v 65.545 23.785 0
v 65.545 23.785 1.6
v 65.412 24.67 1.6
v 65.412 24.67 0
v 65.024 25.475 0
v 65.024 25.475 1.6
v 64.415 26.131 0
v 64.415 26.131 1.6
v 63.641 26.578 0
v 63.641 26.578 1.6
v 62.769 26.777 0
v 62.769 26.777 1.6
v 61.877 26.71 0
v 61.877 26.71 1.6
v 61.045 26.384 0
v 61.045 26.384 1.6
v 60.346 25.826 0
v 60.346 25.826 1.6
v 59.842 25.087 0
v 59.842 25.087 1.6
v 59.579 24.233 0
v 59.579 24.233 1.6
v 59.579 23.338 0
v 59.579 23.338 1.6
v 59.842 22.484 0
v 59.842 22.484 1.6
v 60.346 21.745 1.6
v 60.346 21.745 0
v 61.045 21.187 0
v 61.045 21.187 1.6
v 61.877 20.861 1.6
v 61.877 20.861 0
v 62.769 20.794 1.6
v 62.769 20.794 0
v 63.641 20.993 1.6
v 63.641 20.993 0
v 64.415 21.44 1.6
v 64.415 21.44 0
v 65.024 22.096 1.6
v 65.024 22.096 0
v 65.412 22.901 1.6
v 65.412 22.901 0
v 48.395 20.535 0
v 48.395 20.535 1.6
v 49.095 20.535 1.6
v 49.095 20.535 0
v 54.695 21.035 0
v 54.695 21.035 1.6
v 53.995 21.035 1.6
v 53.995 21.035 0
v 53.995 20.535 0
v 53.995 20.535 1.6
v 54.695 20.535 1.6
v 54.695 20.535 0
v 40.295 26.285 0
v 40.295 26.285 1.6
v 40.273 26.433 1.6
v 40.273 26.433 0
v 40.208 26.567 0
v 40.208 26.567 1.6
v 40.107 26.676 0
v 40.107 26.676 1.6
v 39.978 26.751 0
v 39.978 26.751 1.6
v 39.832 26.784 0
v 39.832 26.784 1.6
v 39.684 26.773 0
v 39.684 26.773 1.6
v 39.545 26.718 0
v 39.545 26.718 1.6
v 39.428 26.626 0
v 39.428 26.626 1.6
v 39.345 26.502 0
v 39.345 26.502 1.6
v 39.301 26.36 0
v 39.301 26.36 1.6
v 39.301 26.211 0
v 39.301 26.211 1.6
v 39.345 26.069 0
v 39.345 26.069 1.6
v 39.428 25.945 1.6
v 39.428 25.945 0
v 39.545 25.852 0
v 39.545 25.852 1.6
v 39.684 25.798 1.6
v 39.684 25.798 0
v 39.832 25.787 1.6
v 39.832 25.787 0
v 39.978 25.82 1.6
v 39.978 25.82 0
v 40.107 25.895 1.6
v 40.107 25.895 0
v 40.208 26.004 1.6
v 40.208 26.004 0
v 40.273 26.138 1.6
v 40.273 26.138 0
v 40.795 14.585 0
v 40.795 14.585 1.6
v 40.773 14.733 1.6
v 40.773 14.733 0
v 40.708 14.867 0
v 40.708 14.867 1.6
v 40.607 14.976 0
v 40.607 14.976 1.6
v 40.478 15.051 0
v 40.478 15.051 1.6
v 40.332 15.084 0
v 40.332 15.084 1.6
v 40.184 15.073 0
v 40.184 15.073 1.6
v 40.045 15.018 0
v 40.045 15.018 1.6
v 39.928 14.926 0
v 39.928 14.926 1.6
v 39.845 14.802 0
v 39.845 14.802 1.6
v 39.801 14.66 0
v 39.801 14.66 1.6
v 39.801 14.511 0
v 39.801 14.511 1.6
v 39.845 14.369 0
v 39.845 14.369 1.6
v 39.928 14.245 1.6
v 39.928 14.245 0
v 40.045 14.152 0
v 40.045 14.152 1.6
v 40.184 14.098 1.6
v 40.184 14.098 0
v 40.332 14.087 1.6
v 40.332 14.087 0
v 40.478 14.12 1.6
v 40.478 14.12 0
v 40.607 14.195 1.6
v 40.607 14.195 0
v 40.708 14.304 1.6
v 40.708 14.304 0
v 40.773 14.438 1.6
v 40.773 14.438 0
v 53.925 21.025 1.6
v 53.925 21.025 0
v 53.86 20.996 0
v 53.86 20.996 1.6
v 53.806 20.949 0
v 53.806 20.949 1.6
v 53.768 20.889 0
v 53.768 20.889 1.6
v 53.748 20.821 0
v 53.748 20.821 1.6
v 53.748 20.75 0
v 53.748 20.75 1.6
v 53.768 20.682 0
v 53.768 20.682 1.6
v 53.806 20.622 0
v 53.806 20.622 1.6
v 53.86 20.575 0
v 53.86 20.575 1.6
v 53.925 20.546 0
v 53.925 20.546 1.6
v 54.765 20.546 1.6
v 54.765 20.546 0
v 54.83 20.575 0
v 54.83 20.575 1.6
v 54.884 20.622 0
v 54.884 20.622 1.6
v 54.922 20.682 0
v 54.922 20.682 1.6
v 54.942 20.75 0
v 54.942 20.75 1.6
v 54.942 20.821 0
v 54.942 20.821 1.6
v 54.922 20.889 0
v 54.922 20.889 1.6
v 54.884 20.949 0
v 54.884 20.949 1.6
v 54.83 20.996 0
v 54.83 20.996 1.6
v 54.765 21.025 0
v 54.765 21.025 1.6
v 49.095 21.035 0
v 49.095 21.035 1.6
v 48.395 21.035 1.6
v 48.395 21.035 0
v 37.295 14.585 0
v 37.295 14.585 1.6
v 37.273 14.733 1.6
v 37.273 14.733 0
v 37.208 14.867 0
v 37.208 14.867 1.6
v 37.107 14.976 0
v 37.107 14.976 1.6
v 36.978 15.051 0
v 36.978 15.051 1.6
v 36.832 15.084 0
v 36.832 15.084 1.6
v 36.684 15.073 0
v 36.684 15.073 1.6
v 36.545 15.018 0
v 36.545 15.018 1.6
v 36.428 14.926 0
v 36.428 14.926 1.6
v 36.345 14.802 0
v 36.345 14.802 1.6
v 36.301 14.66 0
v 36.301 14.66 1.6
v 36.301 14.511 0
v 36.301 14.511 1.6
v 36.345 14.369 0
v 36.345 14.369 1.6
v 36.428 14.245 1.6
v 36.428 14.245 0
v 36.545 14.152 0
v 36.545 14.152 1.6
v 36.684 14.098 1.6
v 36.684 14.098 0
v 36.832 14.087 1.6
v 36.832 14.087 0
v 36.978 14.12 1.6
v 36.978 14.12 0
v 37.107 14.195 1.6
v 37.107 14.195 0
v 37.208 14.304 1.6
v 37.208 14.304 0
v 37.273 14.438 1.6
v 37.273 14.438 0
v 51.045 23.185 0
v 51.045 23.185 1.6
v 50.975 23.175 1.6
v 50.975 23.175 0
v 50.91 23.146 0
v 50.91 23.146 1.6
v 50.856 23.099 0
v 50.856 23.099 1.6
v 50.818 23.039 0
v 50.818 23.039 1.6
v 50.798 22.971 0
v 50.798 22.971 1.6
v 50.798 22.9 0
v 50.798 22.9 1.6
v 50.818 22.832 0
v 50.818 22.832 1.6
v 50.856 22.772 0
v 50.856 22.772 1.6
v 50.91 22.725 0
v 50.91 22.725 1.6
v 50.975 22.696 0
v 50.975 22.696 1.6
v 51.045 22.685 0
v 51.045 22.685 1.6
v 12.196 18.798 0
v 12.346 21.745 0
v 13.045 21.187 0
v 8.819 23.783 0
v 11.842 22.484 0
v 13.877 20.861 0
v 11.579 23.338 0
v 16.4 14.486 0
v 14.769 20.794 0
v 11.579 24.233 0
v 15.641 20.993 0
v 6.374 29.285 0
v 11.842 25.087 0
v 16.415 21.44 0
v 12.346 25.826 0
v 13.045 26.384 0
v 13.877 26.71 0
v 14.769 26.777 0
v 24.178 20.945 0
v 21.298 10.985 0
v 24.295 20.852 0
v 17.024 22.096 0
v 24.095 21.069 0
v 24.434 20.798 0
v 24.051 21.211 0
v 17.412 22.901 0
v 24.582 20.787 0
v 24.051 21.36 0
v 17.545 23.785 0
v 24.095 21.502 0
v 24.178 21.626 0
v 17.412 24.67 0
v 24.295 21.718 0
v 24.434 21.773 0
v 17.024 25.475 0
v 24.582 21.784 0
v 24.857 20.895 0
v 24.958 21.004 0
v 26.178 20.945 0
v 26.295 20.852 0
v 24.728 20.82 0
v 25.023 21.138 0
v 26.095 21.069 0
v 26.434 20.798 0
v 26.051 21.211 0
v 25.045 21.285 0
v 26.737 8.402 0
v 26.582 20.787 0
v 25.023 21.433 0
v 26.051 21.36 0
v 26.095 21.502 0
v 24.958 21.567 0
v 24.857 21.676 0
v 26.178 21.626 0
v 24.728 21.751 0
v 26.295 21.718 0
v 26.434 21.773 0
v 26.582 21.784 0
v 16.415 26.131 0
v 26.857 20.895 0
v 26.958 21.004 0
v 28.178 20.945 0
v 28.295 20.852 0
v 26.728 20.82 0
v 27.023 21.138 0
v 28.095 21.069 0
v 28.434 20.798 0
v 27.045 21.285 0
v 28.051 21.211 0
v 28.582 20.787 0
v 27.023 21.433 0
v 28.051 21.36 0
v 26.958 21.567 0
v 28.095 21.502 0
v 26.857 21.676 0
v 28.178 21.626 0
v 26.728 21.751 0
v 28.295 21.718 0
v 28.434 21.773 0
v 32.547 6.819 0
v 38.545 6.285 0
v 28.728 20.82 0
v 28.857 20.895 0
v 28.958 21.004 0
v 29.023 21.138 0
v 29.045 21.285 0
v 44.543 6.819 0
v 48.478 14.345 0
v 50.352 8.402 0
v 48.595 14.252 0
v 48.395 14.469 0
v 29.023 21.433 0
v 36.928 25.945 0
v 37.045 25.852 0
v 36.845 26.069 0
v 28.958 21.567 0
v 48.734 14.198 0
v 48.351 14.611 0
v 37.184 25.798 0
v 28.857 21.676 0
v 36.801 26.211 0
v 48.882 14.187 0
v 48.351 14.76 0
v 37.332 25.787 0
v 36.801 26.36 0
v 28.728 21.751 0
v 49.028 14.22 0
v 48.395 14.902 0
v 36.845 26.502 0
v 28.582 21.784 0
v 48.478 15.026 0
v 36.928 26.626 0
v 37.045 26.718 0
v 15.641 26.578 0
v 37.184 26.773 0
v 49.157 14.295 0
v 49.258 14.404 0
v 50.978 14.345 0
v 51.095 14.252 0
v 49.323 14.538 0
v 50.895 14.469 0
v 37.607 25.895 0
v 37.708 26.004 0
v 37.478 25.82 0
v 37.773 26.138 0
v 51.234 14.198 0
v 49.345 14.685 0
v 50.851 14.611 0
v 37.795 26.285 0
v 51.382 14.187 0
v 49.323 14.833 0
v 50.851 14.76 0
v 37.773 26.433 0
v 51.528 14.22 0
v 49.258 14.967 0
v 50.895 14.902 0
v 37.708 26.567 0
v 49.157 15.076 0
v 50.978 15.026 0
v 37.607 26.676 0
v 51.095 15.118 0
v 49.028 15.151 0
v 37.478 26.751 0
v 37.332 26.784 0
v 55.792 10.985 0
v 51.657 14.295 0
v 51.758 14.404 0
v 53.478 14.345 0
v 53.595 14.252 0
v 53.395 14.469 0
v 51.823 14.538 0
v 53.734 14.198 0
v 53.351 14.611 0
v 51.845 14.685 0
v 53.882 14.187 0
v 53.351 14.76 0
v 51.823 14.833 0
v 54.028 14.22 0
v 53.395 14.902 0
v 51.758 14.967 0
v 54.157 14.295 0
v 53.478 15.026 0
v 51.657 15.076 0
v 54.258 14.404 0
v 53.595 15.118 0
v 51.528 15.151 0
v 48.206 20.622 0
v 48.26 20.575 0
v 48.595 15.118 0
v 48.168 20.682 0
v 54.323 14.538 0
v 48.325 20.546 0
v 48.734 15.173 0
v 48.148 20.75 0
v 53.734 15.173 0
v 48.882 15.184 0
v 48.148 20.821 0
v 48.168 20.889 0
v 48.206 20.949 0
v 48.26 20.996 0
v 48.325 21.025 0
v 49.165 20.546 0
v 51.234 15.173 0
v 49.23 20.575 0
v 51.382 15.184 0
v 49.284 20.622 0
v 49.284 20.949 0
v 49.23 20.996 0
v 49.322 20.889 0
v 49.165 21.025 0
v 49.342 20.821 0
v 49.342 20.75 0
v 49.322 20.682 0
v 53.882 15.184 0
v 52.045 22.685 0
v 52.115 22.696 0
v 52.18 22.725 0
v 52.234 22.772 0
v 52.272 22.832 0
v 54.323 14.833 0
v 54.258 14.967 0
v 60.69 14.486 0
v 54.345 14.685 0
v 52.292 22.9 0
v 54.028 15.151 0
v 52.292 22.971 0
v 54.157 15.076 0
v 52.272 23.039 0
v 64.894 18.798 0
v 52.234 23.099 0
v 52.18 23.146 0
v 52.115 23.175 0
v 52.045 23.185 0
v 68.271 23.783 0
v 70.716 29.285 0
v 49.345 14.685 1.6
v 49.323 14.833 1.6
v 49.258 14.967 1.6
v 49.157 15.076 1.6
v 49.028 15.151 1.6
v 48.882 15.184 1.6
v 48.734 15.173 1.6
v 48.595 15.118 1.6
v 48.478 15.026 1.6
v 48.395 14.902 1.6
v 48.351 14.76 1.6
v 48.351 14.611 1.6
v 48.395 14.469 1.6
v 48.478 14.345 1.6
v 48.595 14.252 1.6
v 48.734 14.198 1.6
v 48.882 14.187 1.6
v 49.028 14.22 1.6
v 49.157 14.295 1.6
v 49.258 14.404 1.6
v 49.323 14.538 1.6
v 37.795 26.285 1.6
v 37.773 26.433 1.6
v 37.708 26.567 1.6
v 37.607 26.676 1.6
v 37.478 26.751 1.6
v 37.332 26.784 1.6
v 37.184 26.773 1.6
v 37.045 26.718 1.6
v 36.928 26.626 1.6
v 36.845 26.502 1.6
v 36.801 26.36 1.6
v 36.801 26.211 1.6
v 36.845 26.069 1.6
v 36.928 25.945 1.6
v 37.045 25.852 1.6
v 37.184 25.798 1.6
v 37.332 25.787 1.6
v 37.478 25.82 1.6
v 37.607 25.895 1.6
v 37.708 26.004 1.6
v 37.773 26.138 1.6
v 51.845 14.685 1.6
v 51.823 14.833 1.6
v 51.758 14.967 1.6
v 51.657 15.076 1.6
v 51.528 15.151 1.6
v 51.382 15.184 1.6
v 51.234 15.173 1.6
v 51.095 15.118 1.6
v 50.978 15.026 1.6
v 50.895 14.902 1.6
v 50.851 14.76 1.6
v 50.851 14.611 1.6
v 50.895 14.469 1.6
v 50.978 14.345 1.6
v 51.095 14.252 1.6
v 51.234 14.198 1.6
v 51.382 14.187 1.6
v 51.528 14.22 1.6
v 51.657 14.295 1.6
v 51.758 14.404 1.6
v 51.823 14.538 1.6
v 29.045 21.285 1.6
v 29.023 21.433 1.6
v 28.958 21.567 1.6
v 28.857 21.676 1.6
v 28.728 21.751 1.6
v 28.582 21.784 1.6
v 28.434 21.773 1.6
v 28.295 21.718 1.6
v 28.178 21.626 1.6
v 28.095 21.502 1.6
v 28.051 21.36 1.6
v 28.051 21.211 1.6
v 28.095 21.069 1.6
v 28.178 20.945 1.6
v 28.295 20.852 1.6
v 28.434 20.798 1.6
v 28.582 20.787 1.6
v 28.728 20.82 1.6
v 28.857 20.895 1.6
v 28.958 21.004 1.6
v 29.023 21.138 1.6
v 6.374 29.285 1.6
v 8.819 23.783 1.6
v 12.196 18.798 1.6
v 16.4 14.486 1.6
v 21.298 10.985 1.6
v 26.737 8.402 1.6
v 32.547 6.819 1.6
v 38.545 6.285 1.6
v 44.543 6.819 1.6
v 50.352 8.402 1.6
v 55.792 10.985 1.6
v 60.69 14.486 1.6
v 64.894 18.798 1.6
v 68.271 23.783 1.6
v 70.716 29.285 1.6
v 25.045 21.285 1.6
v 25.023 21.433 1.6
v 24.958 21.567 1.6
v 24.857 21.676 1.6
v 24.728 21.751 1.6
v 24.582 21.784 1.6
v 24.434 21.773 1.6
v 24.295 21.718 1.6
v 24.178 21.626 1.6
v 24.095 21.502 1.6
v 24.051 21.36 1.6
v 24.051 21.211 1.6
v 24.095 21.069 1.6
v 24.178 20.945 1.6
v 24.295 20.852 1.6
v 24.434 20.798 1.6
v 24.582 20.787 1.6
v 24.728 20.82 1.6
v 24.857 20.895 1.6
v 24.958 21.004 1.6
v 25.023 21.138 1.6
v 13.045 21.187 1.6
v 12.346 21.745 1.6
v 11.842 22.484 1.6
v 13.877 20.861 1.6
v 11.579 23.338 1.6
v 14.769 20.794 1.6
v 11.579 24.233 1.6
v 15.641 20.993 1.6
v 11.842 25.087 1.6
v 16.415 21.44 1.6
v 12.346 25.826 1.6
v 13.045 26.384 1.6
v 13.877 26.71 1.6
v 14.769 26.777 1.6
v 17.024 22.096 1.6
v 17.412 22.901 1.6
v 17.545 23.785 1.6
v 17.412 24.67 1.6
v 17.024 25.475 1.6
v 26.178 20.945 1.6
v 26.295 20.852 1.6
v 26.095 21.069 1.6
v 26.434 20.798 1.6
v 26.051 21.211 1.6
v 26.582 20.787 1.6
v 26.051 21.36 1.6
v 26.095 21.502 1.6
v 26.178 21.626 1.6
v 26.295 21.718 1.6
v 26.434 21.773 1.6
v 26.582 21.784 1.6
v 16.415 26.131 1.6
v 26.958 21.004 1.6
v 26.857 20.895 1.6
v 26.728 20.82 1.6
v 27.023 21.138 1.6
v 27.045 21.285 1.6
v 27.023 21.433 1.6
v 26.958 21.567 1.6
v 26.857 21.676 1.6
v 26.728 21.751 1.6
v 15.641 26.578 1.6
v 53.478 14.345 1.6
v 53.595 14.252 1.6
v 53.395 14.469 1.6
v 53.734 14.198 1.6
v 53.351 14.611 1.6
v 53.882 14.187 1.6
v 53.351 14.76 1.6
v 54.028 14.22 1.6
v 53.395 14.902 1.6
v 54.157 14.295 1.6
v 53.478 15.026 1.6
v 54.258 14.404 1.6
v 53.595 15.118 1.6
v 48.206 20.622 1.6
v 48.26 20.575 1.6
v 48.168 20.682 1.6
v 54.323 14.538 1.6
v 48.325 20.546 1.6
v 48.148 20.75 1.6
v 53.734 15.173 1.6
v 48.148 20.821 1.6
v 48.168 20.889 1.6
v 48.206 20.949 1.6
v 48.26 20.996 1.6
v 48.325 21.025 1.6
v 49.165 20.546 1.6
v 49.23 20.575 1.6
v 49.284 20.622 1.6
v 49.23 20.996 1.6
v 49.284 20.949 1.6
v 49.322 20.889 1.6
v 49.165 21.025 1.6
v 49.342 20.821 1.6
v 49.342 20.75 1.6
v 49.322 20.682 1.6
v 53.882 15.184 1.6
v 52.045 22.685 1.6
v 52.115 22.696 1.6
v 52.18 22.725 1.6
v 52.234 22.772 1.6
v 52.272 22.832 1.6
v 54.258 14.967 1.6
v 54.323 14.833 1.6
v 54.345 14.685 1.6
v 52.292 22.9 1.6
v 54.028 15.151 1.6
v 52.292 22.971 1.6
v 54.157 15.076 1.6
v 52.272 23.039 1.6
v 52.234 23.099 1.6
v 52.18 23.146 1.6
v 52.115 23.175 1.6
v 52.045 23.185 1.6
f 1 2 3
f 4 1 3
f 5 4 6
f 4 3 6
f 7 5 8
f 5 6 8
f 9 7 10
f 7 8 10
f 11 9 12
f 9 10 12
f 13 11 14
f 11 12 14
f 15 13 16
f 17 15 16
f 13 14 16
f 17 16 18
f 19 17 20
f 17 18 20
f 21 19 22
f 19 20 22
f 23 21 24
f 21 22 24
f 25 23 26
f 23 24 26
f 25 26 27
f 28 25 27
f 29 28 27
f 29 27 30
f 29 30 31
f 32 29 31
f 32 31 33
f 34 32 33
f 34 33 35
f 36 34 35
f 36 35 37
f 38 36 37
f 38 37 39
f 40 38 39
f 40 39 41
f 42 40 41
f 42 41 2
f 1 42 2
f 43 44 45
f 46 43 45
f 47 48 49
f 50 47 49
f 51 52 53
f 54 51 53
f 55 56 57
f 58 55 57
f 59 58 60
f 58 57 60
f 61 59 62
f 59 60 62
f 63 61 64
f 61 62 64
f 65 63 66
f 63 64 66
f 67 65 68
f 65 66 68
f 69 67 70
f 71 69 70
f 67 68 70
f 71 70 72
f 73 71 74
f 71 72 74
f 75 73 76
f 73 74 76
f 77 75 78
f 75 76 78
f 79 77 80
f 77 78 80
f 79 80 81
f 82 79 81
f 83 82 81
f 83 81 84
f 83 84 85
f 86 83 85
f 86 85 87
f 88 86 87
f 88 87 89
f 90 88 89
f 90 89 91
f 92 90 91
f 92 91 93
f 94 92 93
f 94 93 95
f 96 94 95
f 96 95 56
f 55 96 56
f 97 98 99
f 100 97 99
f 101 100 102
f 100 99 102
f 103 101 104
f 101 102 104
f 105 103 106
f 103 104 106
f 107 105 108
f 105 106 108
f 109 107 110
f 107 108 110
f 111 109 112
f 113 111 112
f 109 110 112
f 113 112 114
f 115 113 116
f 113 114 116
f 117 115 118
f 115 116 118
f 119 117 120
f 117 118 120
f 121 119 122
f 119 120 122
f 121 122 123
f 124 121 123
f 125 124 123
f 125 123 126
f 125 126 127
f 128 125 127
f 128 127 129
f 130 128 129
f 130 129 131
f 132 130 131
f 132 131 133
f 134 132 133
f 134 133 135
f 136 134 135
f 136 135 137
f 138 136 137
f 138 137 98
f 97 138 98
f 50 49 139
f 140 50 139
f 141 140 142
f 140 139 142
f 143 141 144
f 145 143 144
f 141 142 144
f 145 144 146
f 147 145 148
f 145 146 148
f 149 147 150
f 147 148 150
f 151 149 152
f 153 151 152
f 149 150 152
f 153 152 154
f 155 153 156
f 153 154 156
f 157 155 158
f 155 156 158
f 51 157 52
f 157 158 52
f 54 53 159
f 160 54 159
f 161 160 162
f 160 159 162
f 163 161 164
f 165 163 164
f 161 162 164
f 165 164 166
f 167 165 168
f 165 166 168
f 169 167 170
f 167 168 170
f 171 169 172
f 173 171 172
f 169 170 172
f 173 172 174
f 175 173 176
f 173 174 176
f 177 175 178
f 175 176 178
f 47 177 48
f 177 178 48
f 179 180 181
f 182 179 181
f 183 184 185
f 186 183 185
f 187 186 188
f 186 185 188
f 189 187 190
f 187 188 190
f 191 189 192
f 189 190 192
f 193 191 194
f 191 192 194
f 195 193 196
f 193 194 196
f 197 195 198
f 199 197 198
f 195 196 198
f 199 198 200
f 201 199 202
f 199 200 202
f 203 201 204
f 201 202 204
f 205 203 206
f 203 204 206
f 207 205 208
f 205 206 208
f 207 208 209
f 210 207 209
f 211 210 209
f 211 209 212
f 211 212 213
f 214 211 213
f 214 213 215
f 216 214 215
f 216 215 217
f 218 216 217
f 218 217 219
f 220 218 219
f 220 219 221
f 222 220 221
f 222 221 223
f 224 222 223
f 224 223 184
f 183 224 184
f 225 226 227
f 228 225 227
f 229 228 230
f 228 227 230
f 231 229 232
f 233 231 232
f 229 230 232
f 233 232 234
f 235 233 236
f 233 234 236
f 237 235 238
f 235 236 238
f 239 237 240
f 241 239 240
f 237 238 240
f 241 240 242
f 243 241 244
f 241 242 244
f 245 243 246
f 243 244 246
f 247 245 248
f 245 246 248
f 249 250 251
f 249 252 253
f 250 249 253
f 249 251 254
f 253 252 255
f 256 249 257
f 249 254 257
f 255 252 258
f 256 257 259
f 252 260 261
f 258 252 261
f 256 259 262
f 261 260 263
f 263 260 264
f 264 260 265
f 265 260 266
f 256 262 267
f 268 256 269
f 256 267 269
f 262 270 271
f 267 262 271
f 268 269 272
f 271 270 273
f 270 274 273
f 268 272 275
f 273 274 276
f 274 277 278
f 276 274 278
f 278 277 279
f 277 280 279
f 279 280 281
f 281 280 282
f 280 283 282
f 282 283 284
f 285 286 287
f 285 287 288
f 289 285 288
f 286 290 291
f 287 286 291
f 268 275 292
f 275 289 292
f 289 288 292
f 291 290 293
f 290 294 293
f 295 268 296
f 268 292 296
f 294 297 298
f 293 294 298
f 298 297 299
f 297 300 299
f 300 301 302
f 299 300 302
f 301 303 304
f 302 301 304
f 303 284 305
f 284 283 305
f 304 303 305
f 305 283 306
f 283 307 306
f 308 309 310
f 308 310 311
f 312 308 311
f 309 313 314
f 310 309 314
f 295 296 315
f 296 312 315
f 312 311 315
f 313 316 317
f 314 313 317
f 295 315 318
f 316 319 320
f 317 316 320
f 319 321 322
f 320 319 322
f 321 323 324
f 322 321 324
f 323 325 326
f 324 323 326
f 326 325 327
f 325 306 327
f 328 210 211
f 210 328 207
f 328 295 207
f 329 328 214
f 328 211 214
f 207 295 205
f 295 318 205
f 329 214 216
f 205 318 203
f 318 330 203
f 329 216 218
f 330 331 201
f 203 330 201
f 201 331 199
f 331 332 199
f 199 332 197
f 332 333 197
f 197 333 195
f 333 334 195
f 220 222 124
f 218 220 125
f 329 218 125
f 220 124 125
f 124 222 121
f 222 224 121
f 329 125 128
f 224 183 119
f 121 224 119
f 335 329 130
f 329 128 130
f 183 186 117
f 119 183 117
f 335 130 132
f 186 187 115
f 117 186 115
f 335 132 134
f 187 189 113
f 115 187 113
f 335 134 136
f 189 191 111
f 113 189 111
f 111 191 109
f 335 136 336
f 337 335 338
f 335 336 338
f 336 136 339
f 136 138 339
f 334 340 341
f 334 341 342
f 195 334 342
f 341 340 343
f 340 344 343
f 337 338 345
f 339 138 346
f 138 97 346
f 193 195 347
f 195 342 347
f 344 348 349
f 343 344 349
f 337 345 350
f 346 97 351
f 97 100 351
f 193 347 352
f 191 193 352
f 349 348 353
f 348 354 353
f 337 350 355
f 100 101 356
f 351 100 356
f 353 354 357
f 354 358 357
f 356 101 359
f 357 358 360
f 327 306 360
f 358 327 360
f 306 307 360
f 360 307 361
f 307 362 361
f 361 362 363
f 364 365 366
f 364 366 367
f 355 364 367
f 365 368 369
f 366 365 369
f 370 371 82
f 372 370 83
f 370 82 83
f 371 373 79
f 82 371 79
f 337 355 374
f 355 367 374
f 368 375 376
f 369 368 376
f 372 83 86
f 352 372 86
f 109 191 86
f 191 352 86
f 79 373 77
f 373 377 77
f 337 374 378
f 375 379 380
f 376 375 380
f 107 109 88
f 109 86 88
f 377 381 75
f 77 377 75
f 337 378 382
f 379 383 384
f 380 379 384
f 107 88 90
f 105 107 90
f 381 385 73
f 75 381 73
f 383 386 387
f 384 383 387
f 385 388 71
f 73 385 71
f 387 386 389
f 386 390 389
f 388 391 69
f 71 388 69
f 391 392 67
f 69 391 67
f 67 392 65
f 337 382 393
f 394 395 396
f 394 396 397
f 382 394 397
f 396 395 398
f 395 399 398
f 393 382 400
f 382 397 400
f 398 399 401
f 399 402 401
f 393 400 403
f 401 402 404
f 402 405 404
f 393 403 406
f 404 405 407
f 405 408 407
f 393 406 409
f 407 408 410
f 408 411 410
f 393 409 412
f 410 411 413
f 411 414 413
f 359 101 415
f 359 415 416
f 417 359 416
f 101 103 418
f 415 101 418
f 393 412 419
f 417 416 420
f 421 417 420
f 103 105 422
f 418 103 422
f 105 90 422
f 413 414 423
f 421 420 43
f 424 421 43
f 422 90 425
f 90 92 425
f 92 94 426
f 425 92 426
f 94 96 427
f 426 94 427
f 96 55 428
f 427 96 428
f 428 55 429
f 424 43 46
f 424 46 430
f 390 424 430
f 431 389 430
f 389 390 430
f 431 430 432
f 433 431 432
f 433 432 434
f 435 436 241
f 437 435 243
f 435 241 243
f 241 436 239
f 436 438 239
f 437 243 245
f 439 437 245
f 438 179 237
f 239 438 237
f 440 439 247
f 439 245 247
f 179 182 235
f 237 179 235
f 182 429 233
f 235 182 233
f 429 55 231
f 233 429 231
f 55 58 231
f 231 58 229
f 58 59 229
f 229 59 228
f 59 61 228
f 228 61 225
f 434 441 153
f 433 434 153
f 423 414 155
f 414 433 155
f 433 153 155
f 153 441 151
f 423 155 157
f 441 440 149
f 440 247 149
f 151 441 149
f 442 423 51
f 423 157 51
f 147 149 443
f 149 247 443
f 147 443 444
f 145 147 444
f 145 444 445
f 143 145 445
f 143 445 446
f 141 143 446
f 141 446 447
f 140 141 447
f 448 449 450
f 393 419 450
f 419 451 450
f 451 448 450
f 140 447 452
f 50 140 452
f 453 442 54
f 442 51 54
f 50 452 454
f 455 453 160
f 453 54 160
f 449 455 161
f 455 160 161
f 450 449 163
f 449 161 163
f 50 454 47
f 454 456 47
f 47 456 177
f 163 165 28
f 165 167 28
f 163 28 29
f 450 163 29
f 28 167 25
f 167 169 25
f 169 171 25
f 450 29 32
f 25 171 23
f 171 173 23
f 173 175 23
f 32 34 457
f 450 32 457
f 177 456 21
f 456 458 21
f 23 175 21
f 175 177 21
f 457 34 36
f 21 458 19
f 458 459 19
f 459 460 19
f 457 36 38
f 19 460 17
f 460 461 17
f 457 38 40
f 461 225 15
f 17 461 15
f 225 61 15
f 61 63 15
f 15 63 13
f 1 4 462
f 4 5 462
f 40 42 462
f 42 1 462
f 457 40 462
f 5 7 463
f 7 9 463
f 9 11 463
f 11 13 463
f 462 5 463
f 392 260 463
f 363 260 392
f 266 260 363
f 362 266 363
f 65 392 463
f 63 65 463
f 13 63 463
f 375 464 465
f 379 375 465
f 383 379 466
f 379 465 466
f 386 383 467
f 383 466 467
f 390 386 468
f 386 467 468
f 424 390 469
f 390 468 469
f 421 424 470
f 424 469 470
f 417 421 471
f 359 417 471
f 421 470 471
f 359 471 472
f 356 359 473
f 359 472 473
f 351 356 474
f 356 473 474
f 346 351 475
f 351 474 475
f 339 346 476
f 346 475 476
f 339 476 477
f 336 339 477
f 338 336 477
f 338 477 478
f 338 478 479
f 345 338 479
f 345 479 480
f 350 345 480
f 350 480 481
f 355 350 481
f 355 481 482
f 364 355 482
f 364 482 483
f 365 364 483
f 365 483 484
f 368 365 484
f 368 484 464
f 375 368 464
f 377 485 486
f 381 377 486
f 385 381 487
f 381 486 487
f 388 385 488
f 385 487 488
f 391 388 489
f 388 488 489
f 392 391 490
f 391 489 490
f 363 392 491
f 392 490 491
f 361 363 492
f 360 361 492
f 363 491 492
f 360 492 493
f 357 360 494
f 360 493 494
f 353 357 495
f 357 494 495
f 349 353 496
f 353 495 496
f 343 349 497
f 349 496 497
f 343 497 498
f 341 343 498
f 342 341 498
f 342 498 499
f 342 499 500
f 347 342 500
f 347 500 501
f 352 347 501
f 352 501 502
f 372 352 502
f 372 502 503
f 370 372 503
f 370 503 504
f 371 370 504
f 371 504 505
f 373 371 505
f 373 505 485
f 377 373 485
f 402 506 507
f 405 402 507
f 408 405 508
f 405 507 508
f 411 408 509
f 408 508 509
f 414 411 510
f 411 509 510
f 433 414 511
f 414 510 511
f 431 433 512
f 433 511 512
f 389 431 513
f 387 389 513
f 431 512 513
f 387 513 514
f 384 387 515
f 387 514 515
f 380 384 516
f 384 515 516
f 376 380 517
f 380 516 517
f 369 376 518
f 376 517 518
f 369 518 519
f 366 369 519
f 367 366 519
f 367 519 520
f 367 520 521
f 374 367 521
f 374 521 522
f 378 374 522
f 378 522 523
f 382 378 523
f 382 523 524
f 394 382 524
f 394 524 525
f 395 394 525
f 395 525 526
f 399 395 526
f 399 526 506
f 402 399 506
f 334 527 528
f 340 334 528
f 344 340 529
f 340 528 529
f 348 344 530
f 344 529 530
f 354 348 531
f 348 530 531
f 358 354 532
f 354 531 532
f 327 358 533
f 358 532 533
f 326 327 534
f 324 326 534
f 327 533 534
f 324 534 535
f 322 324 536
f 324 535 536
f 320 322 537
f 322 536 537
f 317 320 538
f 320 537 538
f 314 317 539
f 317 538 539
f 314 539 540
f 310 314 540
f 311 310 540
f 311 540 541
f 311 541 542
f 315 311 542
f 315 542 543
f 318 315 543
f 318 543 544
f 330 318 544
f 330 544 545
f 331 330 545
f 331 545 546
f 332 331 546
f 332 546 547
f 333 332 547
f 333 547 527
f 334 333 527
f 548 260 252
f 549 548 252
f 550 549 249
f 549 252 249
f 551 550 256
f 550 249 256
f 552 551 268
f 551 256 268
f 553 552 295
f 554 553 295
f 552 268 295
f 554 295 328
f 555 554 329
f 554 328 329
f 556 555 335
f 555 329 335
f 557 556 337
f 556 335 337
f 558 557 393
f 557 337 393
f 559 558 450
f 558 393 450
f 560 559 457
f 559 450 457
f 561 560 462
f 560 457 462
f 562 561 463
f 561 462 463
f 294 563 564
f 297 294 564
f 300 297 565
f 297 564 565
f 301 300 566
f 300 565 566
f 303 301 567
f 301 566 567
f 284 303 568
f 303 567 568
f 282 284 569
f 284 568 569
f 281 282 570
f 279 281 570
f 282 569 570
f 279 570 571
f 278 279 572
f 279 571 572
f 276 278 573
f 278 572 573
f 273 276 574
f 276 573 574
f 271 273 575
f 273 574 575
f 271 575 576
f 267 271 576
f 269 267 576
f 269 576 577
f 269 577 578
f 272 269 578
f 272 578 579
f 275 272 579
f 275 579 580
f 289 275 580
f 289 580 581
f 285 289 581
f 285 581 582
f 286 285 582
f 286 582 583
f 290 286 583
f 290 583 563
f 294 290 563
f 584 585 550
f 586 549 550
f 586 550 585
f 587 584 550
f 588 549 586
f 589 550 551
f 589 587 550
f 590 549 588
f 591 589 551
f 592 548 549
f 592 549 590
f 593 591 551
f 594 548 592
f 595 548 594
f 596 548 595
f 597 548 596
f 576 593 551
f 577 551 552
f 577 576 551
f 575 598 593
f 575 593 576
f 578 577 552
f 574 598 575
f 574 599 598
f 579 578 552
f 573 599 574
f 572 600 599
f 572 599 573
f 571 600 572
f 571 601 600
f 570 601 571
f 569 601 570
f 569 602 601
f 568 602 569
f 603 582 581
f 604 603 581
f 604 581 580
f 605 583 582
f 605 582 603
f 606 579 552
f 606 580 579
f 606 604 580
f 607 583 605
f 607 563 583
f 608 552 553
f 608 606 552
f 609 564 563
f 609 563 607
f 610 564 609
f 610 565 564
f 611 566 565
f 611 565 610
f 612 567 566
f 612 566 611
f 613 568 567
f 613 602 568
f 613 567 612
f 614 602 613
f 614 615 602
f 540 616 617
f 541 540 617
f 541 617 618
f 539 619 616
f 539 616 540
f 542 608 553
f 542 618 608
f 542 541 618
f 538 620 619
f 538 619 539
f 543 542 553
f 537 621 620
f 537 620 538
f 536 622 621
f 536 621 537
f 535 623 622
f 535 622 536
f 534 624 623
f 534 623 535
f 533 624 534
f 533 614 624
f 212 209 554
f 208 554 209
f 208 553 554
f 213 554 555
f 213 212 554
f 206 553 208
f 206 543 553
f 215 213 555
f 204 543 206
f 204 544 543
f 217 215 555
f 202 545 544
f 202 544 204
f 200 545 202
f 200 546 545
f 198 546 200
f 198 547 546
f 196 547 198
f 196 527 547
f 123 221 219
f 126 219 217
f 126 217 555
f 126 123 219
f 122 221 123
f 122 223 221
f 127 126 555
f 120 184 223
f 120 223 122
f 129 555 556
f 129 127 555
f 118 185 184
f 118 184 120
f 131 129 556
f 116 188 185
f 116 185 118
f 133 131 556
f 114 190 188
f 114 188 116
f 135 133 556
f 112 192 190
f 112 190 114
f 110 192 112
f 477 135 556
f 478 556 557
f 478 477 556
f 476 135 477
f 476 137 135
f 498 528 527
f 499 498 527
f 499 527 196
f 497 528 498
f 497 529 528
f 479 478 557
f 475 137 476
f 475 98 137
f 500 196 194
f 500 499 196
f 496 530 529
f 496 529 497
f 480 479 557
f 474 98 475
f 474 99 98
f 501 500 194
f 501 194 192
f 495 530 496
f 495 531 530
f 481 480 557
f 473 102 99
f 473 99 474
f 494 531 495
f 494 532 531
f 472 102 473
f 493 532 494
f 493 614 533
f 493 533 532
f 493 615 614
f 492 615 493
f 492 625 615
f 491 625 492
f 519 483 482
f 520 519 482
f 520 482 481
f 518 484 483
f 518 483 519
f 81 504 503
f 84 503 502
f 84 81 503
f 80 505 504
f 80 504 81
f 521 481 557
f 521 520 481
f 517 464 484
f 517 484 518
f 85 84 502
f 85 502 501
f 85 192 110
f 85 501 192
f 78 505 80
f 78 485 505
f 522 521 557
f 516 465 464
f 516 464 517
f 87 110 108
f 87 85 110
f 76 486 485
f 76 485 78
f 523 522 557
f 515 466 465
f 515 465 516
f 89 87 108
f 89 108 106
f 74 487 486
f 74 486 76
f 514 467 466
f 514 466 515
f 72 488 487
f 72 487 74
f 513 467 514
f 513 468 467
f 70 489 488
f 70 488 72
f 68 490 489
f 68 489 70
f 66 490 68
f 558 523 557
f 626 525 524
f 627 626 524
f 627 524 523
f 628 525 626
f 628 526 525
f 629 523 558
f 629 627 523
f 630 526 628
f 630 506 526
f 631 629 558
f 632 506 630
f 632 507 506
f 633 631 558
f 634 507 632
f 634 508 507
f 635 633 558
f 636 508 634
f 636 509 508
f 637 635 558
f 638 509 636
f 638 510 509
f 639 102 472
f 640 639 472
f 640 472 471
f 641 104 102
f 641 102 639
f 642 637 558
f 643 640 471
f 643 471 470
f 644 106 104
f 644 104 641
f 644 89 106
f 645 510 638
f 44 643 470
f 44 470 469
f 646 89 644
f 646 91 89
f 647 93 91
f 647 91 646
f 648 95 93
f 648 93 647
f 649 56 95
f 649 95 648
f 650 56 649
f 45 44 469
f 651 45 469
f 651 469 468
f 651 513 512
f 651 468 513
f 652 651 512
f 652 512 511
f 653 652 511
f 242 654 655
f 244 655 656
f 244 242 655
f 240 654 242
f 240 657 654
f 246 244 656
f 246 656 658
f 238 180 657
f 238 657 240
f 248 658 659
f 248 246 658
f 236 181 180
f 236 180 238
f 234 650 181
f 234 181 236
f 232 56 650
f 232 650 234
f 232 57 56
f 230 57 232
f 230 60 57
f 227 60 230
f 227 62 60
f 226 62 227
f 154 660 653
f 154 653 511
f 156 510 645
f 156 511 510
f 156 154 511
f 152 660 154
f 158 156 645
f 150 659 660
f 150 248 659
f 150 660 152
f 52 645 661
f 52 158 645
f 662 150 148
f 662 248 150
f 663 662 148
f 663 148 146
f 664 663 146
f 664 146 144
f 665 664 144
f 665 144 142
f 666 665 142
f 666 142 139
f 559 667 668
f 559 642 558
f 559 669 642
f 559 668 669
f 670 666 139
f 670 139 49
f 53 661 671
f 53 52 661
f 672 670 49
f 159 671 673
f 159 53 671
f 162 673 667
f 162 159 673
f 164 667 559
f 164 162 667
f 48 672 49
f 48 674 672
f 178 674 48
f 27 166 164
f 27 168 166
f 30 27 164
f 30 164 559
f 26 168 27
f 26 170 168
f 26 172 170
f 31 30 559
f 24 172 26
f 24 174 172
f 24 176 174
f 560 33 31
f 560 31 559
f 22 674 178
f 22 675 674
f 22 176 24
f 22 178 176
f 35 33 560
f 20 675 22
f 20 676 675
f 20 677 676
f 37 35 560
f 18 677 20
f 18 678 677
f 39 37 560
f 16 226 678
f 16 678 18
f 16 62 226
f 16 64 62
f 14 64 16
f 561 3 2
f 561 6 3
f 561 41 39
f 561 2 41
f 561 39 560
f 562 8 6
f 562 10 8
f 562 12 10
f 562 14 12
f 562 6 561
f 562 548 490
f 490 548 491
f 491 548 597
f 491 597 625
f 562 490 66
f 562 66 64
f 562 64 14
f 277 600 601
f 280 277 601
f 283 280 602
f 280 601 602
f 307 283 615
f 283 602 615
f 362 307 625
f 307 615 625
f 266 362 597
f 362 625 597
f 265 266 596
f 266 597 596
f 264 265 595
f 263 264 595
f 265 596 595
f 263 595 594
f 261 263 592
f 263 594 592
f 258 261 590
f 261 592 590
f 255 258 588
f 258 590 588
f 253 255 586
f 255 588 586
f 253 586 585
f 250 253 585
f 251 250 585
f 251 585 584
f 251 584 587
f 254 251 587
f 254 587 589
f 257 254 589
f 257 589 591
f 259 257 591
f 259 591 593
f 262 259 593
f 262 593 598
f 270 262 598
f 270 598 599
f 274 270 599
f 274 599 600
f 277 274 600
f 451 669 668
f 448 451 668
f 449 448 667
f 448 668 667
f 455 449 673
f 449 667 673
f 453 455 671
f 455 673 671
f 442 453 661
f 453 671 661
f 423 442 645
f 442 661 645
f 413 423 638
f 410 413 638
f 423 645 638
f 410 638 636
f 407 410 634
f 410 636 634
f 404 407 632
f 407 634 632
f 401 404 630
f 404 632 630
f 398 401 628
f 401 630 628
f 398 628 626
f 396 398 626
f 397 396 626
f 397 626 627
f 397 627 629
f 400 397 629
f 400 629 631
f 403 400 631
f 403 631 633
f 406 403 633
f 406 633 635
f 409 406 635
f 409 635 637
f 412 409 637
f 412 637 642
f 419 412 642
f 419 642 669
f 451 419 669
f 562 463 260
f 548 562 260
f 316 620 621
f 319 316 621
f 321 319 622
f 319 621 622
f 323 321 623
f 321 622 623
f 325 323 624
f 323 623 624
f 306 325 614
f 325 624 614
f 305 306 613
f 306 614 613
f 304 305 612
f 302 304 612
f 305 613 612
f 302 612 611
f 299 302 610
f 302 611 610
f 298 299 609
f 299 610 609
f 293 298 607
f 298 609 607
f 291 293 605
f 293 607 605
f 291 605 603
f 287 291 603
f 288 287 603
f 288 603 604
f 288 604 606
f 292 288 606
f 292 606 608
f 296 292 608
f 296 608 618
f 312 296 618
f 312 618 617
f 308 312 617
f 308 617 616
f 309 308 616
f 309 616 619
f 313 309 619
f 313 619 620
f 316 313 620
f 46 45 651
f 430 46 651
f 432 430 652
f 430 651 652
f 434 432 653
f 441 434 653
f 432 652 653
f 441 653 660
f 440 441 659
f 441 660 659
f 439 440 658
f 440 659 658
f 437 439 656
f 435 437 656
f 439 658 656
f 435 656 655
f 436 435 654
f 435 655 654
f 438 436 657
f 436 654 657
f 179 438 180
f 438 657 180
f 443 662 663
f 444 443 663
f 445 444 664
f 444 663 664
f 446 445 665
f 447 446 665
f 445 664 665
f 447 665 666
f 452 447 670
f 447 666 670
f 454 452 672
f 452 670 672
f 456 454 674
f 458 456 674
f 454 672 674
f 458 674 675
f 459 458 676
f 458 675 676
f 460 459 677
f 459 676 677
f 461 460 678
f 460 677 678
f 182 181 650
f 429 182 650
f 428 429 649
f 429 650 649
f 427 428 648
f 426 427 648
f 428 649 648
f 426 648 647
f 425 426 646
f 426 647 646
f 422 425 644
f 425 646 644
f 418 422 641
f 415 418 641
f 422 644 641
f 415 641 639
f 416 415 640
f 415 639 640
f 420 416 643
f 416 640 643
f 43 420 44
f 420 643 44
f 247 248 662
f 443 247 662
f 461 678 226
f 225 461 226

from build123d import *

# Parameters (mm, degrees)
F1_DEPTH  = 1.6
F2_R      = 3
F3_DEPTH  = 3
F6_R      = 0.5
F7_R      = 0.5
F8_R      = 0.5
F4_R      = 0.5
F9_DEPTH  = 4
F10_R     = 2.1
F11_DEPTH = 0.2


with BuildPart() as f1:
    # F0 (on Top) → F1 (new body)
    with BuildSketch(Plane.XY):
        with BuildLine():
            Line((70.716411, 29.285482), (6.37358, 29.285482))
            ThreePointArc((6.37358, 29.285482), (38.544995, 6.285482), (70.716411, 29.285482))
        make_face()
    extrude(amount=F1_DEPTH)

    # F2 (on face) → F3 (cut)
    with BuildSketch(Plane.XY.offset(1.6)):
        with Locations((14.544995, 23.785482)):
            Circle(F2_R)
        with Locations((62.544995, 23.785482)):
            Circle(F2_R)
    extrude(amount=-F3_DEPTH, mode=Mode.SUBTRACT)

    # F6 (on face) + F7 (on face) + F8 (on face) + F5 (on face) + F4 (on face) → F9 (cut)
    with BuildSketch(Plane.XY.offset(1.6)):
        with Locations((48.844995, 14.685482)):
            Circle(F6_R)
        with Locations((53.844995, 14.685482)):
            Circle(F6_R)
        with Locations((51.344995, 14.685482)):
            Circle(F6_R)
    with BuildSketch(Plane.XY.offset(1.6)):
        with Locations((37.294995, 26.285482)):
            Circle(F7_R)
        with Locations((39.794995, 26.285482)):
            Circle(F7_R)
    with BuildSketch(Plane.XY.offset(1.6)):
        with Locations((36.794995, 14.585482)):
            Circle(F8_R)
        with Locations((40.294995, 14.585482)):
            Circle(F8_R)
    with BuildSketch(Plane.XY.offset(1.6)):
        with BuildLine():
            ThreePointArc((51.044995, 23.185482), (50.794995, 22.935482), (51.044995, 22.685482))
            Line((51.044995, 22.685482), (52.044995, 22.685482))
            ThreePointArc((52.044995, 22.685482), (52.294995, 22.935482), (52.044995, 23.185482))
            Line((52.044995, 23.185482), (51.044995, 23.185482))
        make_face()
        with BuildLine():
            ThreePointArc((49.094995, 20.535482), (49.344995, 20.785482), (49.094995, 21.035482))
            Line((49.094995, 21.035482), (48.394995, 21.035482))
            ThreePointArc((48.394995, 21.035482), (48.144995, 20.785482), (48.394995, 20.535482))
            Line((48.394995, 20.535482), (49.094995, 20.535482))
        make_face()
        with BuildLine():
            Line((53.994995, 20.535482), (54.694995, 20.535482))
            ThreePointArc((54.694995, 20.535482), (54.944995, 20.785482), (54.694995, 21.035482))
            Line((54.694995, 21.035482), (53.994995, 21.035482))
            ThreePointArc((53.994995, 21.035482), (53.744995, 20.785482), (53.994995, 20.535482))
        make_face()
    with BuildSketch(Plane.XY.offset(1.6)):
        with Locations((24.544995, 21.285482)):
            Circle(F4_R)
        with Locations((26.544995, 21.285482)):
            Circle(F4_R)
        with Locations((28.544995, 21.285482)):
            Circle(F4_R)
    extrude(amount=-F9_DEPTH, mode=Mode.SUBTRACT)

    # F10 (on face) → F11 (cut)
    with BuildSketch(Plane(origin=(0, 0, 0), x_dir=(1, 0, 0), z_dir=(0, 0, -1))):
        with Locations((62.544995, -23.785482)):
            Circle(F10_R)
        with Locations((14.544995, -23.785482)):
            Circle(F10_R)
    extrude(amount=-F11_DEPTH, mode=Mode.SUBTRACT)


solid = f1.part
